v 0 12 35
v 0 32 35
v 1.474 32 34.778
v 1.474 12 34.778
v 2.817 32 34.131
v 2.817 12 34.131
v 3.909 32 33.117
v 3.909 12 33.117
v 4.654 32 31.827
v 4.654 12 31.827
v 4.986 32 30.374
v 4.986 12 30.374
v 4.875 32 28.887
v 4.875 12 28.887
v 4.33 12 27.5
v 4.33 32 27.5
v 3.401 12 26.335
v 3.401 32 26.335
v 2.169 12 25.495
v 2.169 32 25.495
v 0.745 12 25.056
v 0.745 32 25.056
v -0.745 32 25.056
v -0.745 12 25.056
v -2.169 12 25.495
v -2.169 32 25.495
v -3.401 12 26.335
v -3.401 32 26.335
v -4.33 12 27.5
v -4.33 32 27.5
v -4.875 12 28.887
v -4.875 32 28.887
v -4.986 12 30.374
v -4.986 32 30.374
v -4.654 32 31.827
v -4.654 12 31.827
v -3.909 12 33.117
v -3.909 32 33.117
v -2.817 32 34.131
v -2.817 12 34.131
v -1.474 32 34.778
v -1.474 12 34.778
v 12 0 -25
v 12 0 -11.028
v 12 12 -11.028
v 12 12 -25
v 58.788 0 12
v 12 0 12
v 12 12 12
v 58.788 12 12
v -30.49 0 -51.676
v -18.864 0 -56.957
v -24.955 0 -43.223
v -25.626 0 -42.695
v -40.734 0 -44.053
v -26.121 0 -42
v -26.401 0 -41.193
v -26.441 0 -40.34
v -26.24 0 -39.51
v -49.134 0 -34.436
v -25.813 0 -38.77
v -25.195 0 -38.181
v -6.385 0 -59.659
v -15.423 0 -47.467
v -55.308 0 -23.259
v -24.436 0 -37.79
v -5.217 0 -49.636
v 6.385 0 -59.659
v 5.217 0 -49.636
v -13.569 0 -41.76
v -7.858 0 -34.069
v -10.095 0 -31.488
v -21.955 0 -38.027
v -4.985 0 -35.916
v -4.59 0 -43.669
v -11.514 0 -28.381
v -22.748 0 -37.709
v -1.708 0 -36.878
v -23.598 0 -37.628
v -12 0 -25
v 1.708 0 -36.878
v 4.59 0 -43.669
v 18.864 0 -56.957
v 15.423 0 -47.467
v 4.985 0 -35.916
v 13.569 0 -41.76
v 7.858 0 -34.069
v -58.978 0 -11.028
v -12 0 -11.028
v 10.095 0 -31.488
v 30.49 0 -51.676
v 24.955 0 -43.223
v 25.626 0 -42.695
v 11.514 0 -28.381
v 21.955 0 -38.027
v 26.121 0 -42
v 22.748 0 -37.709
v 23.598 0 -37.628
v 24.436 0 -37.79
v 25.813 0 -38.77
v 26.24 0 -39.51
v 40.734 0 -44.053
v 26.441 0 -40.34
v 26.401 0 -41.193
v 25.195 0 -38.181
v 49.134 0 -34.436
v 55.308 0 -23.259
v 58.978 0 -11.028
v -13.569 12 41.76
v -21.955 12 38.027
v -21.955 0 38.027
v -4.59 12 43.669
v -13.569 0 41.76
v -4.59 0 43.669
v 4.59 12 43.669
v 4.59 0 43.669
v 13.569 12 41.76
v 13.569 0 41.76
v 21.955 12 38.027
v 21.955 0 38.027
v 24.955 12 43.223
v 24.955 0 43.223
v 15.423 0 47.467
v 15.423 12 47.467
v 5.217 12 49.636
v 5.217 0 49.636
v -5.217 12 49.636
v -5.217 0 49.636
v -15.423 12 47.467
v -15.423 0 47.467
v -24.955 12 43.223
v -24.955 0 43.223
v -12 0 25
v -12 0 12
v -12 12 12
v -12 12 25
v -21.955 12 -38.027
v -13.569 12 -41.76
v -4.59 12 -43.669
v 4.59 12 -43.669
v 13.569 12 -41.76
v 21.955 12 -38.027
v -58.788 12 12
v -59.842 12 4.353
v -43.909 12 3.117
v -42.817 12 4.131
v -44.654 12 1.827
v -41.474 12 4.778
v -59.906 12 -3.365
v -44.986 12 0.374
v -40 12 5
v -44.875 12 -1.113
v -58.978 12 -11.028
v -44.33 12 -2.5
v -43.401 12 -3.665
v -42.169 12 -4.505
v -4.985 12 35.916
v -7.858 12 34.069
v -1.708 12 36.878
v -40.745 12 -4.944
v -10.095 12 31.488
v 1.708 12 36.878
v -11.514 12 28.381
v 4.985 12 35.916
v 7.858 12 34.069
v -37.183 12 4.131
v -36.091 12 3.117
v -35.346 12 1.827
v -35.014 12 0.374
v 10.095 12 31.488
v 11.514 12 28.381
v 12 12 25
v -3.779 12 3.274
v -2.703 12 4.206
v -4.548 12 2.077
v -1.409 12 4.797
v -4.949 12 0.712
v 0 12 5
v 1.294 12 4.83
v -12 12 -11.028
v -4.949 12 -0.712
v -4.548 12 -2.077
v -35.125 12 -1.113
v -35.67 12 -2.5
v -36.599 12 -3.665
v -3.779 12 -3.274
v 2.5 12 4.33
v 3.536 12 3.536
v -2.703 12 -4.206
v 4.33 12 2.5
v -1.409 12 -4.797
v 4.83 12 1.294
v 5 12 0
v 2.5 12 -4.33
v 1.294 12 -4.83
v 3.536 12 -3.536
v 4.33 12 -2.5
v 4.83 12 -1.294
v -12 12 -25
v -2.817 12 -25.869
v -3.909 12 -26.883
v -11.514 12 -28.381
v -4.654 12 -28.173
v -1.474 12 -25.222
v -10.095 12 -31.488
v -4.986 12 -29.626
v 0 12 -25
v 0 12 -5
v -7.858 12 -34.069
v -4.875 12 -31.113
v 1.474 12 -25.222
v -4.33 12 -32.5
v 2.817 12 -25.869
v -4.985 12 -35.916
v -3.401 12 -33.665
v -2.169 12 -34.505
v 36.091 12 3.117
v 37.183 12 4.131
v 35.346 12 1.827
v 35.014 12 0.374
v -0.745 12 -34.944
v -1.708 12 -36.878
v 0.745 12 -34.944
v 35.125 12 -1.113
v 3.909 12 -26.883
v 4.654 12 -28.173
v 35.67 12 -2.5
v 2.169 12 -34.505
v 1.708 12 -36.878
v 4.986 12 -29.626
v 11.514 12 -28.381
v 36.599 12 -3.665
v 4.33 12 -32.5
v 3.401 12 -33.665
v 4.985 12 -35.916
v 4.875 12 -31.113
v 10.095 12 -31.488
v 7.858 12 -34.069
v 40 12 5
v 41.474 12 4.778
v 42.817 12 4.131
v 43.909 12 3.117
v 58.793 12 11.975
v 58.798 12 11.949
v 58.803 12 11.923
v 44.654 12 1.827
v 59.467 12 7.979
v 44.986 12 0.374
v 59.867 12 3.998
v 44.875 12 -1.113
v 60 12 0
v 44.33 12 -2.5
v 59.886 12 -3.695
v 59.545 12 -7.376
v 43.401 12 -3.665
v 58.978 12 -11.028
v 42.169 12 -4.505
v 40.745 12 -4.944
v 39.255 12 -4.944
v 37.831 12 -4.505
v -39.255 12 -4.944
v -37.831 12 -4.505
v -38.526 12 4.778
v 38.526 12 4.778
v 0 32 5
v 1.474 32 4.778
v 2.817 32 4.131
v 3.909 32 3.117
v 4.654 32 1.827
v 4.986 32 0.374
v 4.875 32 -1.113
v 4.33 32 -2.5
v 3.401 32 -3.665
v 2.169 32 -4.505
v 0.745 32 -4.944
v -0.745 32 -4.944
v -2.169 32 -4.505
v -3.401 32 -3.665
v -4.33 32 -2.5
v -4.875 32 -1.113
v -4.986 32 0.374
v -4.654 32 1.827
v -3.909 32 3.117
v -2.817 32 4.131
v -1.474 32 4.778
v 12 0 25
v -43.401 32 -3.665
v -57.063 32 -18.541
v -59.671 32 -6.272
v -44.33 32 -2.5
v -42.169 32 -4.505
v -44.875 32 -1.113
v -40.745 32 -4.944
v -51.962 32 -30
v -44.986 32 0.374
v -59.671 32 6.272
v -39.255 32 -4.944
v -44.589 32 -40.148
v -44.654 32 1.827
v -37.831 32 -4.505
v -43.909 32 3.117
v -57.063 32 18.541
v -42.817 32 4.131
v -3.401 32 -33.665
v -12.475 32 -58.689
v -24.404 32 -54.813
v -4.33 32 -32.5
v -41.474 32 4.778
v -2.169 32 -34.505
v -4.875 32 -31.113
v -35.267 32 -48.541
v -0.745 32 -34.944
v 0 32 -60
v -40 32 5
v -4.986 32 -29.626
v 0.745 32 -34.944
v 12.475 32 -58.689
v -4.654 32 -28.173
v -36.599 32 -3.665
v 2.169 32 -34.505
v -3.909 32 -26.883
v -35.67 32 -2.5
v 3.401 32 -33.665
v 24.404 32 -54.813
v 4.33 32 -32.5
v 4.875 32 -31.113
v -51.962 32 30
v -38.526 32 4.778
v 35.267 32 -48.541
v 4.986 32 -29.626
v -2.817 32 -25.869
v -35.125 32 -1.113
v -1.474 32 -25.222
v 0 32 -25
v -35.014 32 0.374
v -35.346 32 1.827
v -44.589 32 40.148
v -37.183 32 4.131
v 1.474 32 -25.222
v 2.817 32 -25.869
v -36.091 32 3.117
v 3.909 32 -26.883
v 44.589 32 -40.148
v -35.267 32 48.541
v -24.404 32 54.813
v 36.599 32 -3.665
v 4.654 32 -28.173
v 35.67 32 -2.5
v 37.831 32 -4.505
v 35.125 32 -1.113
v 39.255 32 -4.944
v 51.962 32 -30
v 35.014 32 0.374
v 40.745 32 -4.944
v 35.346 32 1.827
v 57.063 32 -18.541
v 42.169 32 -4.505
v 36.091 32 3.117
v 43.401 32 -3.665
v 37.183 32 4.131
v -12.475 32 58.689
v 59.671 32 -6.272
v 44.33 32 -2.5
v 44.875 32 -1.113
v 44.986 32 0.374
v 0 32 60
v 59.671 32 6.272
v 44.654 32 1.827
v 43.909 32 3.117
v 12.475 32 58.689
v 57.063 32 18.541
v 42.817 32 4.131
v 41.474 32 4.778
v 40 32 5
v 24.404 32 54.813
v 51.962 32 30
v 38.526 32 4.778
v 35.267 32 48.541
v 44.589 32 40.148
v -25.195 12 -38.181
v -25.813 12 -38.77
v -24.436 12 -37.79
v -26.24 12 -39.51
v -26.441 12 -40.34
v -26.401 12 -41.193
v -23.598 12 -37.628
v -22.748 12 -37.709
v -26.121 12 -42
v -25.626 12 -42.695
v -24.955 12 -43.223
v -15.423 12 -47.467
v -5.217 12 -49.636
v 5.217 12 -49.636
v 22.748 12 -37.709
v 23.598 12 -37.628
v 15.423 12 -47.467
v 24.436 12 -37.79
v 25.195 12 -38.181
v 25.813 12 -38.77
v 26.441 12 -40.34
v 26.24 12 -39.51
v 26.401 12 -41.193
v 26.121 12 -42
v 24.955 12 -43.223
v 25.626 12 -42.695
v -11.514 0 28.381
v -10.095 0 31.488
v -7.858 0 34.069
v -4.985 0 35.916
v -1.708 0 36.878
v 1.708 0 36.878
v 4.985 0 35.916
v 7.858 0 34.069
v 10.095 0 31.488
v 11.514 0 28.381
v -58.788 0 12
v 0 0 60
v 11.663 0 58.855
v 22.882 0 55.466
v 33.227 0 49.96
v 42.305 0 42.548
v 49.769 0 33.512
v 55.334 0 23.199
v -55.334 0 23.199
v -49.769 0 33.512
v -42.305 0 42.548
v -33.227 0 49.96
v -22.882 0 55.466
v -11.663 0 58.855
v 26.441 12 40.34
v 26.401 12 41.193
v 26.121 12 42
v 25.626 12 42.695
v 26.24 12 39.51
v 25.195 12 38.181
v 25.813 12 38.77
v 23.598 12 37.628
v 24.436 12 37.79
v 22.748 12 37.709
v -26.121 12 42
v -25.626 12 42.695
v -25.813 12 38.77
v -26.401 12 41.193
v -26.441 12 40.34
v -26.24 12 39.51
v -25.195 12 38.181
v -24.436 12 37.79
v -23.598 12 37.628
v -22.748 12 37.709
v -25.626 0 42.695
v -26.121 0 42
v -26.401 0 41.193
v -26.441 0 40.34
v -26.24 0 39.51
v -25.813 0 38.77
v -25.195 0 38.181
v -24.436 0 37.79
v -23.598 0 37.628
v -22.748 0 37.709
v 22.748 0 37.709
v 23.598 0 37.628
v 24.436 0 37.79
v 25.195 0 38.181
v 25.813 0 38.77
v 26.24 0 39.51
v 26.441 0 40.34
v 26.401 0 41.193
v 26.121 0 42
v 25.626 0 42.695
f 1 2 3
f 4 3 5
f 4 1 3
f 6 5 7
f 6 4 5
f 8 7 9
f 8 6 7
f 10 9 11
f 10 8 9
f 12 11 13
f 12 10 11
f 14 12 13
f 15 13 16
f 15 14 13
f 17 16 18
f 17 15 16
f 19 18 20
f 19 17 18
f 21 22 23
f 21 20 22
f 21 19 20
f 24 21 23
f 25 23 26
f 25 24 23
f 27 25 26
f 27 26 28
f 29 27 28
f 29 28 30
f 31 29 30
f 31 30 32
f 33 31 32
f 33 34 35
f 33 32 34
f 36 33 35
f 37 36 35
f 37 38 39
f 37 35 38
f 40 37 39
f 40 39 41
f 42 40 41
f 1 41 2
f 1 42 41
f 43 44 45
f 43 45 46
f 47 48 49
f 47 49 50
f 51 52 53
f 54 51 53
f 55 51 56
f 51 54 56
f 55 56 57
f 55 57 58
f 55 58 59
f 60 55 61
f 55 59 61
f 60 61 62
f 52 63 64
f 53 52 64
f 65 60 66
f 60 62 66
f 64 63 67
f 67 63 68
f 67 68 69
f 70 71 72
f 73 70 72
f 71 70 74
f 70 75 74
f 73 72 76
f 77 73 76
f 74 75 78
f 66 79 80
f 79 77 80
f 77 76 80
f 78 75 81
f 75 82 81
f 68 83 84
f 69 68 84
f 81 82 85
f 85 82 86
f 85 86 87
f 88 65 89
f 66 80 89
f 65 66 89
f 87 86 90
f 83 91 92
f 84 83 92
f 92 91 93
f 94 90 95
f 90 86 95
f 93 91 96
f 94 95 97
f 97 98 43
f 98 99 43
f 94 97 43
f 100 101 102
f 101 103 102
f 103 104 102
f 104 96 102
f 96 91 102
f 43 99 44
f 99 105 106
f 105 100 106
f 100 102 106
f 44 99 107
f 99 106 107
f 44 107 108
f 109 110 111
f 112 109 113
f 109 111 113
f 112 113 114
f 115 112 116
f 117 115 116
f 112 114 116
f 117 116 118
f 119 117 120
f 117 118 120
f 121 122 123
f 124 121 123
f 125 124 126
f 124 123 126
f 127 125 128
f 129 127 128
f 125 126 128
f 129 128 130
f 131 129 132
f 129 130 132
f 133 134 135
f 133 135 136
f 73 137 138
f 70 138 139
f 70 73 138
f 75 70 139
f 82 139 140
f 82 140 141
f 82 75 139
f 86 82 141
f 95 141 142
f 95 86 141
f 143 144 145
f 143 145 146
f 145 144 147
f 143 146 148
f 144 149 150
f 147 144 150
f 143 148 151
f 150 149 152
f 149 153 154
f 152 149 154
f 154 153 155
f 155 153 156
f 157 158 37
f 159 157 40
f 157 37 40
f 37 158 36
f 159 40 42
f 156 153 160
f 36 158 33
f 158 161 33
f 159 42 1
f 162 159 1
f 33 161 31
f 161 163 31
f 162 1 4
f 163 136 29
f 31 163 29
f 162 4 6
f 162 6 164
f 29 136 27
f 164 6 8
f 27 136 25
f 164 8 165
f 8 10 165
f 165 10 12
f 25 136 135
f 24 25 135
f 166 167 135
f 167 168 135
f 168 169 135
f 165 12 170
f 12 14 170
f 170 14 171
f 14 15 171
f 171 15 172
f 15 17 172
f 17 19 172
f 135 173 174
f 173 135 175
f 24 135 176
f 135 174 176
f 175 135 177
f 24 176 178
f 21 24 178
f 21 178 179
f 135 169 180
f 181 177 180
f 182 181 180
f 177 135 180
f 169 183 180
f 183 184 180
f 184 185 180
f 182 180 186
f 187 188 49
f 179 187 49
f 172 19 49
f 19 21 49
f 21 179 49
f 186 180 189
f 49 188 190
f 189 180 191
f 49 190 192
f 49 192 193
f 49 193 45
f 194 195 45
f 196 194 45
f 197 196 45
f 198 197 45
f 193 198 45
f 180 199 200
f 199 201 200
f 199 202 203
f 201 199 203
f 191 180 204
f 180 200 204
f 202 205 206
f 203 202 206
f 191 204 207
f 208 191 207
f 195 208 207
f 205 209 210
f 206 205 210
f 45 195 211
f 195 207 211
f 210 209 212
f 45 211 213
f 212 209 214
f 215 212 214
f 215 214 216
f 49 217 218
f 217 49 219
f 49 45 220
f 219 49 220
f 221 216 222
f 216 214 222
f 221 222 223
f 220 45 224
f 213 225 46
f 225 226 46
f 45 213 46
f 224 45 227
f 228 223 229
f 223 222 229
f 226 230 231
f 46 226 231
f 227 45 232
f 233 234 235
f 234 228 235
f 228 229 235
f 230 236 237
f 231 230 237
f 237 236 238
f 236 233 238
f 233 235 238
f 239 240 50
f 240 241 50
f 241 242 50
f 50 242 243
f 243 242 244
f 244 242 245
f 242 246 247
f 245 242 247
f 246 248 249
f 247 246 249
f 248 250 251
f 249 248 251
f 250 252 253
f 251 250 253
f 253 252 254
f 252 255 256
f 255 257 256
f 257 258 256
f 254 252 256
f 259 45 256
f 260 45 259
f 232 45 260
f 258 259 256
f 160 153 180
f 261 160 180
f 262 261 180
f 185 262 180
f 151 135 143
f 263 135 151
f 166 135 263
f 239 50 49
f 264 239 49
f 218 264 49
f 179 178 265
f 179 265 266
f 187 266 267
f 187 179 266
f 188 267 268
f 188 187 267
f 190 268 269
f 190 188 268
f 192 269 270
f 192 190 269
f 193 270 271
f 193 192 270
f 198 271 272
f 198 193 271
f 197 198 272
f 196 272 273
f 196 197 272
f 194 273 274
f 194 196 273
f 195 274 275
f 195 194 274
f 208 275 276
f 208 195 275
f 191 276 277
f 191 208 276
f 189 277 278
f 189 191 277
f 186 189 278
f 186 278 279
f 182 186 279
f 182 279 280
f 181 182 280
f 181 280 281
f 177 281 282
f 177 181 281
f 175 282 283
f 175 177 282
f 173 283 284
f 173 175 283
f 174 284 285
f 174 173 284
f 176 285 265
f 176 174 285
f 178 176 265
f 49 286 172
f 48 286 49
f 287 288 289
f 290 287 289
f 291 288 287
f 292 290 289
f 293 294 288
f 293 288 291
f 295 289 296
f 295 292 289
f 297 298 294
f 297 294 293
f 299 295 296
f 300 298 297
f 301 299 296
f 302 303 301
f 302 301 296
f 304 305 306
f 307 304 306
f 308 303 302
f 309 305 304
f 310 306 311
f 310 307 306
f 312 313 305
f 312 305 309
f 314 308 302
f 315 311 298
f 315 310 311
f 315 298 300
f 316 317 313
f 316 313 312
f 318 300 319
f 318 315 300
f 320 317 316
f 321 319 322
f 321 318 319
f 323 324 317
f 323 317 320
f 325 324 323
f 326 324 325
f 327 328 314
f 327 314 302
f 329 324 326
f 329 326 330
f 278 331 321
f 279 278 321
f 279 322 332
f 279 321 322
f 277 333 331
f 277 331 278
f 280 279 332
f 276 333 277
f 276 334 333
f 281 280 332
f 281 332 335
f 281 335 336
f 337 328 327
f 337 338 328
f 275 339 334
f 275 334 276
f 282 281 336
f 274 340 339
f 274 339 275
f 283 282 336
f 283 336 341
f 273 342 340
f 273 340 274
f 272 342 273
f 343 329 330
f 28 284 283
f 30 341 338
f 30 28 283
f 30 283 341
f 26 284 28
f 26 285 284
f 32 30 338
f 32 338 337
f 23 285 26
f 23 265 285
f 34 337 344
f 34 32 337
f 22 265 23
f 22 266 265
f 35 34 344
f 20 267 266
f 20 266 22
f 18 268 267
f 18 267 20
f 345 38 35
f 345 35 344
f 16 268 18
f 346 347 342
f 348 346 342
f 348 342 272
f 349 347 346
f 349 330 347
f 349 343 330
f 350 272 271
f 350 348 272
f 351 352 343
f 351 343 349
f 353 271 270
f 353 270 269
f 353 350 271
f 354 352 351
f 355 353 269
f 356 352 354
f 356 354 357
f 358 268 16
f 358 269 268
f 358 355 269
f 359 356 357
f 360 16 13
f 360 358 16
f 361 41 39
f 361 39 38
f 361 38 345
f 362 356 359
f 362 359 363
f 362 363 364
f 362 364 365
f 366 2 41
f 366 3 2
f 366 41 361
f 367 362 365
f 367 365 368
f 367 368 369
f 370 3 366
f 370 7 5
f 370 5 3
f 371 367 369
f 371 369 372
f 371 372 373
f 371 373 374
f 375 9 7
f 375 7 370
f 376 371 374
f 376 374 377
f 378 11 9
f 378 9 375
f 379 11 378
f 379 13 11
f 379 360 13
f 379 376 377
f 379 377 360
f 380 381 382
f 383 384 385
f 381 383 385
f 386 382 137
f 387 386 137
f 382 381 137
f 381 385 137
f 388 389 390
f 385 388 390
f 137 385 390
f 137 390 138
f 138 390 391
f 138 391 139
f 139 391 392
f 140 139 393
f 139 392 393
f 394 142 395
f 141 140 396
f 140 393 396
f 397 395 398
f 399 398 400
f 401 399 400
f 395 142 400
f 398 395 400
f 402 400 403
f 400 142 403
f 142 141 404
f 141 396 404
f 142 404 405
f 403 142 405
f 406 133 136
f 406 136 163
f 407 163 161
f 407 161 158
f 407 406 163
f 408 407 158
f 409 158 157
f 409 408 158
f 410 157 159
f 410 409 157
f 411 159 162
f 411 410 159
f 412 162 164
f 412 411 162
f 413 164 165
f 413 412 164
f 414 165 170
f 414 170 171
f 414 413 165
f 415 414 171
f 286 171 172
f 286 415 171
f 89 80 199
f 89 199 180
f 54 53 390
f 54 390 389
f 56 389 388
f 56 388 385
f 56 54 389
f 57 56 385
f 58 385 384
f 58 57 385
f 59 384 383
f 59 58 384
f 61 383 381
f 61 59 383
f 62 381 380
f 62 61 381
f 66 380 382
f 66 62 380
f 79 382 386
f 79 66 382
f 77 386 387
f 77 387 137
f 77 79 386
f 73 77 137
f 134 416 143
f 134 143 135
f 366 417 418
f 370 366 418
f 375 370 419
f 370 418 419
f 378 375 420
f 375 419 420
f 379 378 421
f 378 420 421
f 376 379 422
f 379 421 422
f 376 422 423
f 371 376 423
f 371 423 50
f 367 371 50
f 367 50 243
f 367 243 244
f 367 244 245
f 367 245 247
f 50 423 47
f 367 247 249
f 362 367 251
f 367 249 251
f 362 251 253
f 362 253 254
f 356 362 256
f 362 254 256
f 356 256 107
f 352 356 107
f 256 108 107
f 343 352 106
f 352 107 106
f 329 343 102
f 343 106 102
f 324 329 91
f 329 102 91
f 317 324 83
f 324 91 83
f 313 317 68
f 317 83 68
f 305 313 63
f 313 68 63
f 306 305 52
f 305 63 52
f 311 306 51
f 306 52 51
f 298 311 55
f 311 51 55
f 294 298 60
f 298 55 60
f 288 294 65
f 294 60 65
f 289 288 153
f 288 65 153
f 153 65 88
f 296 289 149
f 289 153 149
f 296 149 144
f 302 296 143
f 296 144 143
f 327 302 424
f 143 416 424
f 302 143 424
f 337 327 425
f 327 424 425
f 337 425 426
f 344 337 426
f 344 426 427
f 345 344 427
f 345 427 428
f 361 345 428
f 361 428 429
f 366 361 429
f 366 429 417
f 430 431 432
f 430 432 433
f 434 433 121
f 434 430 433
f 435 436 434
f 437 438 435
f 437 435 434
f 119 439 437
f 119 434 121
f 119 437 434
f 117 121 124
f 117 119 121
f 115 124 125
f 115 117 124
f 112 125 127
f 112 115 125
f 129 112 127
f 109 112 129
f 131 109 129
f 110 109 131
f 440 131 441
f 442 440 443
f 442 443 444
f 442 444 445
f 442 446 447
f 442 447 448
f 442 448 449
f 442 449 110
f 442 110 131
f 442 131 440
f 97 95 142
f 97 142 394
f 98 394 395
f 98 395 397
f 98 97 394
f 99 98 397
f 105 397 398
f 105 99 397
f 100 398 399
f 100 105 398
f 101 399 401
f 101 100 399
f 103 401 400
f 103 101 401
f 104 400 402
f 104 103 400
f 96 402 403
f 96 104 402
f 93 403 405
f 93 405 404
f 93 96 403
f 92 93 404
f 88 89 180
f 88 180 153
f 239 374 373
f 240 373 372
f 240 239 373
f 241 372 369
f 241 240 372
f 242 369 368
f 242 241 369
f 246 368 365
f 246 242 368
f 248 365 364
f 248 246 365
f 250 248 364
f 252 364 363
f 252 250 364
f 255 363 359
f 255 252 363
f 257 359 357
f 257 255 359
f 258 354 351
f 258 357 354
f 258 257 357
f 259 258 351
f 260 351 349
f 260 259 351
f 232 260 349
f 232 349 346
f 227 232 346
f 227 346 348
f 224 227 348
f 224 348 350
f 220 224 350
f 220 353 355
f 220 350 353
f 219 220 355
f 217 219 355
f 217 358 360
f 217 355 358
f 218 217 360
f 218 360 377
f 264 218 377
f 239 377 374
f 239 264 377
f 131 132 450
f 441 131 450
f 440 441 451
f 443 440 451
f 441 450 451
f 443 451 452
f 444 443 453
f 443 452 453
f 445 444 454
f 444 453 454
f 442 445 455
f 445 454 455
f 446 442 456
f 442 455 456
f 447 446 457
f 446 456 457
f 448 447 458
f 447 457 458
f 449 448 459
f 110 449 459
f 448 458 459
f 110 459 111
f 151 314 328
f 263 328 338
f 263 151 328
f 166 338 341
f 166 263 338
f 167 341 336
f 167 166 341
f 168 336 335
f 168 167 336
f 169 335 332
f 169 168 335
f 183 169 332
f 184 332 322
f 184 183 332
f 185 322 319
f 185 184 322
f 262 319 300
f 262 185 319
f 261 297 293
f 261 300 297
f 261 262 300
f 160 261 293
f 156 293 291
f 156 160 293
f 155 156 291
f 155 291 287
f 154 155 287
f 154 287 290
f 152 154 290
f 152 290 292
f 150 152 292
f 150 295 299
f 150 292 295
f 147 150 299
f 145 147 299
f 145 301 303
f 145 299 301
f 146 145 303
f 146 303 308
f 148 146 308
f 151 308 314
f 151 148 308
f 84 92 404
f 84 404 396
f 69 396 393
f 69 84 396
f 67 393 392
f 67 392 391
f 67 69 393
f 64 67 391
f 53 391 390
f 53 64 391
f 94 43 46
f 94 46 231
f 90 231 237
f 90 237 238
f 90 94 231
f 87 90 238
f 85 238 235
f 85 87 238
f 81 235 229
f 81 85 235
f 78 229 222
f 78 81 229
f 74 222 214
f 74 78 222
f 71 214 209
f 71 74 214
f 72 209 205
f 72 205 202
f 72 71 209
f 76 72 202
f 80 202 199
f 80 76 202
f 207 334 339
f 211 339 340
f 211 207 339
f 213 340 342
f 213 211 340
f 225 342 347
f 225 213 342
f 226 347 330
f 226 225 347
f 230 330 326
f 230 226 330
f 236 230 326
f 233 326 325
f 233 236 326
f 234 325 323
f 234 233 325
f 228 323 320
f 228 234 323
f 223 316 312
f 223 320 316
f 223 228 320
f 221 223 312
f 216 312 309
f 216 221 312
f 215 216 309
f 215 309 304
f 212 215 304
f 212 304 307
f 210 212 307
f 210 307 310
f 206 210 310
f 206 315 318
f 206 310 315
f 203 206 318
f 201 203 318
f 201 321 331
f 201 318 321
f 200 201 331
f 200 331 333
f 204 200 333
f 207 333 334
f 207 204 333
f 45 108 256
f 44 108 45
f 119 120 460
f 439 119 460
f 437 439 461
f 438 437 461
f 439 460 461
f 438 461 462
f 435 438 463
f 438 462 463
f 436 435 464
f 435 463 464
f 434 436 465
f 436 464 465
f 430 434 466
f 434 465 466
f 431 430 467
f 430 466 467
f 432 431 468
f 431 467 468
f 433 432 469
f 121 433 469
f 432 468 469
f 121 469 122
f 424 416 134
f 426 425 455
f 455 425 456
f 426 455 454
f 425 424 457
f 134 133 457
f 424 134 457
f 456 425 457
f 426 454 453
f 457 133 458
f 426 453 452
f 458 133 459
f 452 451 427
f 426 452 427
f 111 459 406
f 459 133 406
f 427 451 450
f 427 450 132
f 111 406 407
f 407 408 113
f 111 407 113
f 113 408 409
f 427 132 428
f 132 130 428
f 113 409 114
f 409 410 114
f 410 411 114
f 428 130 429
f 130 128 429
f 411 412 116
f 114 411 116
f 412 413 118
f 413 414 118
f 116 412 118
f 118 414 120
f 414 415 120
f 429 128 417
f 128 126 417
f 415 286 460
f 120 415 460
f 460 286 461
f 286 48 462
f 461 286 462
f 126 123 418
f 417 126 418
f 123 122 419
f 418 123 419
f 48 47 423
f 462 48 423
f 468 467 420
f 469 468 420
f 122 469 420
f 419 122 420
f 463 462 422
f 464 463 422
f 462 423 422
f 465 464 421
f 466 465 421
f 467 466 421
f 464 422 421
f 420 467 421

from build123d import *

# Parameters (mm, degrees)
SKETCH4_R           = 60
BOSS_EXTRUDE2_DEPTH = 32
CUT_EXTRUDE1_DEPTH  = 12
CUT_EXTRUDE2_DEPTH  = 12
SKETCH4_18_R        = 5
CUT_EXTRUDE6_DEPTH  = 12
SKETCH4_19_R        = 5
CUT_EXTRUDE7_DEPTH  = 40
SKETCH4_20_R        = 5
CUT_EXTRUDE8_DEPTH  = 40
SKETCH4_21_R        = 5
CUT_EXTRUDE9_DEPTH  = 40
SKETCH4_22_R        = 5
CUT_EXTRUDE10_DEPTH = 40
SKETCH4_23_R        = 5
CUT_EXTRUDE11_DEPTH = 40


with BuildPart() as part:
    # Sketch4 → Boss-Extrude2 (new body)
    with BuildSketch(Plane(origin=(0, 0, 0), x_dir=(1, 0, 0), z_dir=(0, 1, 0))):
        Circle(SKETCH4_R)
    extrude(amount=BOSS_EXTRUDE2_DEPTH)

    # Sketch4<4> → Cut-Extrude1 (cut)
    with BuildSketch(Plane(origin=(0, 0, 0), x_dir=(1, 0, 0), z_dir=(0, 1, 0))):
        with BuildLine():
            ThreePointArc((24.954792471, 43.222968452), (0, 49.909584942), (-24.954792471, 43.222968452))
            ThreePointArc((-24.954792471, 43.222968452), (-26.052868682, 39.124892241), (-21.954792471, 38.026816029))
            ThreePointArc((-21.954792471, 38.026816029), (0, 43.909584942), (21.954792471, 38.026816029))
            ThreePointArc((21.954792471, 38.026816029), (26.052868682, 39.124892241), (24.954792471, 43.222968452))
        make_face()
    extrude(amount=CUT_EXTRUDE1_DEPTH, mode=Mode.SUBTRACT)

    # Sketch4<5> → Cut-Extrude2 (cut)
    with BuildSketch(Plane(origin=(0, 0, 0), x_dir=(1, 0, 0), z_dir=(0, 1, 0))):
        with BuildLine():
            ThreePointArc((24.954792471, -43.222968452), (0, -49.909584942), (-24.954792471, -43.222968452))
            ThreePointArc((-24.954792471, -43.222968452), (-26.052868682, -39.124892241), (-21.954792471, -38.026816029))
            ThreePointArc((-21.954792471, -38.026816029), (0, -43.909584942), (21.954792471, -38.026816029))
            ThreePointArc((21.954792471, -38.026816029), (26.052868682, -39.124892241), (24.954792471, -43.222968452))
        make_face()
    extrude(amount=CUT_EXTRUDE2_DEPTH, mode=Mode.SUBTRACT)

    # Sketch4<18> → Cut-Extrude6 (cut)
    with BuildSketch(Plane(origin=(0, 0, 0), x_dir=(1, 0, 0), z_dir=(0, 1, 0))):
        with BuildLine():
            ThreePointArc((60, 0), (59.74389008, 5.537833341), (58.97774673, 11.028390213))
            Line((58.97774673, 11.028390213), (12, 11.028390213))
            Line((12, 11.028390213), (12, 25))
            ThreePointArc((12, 25), (0, 37), (-12, 25))
            Line((-12, 25), (-12, 11.028390213))
            Line((-12, 11.028390213), (-58.97774673, 11.028390213))
            ThreePointArc((-58.97774673, 11.028390213), (-59.997958043, -0.495005778), (-58.787753827, -12))
            Line((-58.787753827, -12), (-12, -12))
            Line((-12, -12), (-12, -25))
            ThreePointArc((-12, -25), (0, -37), (12, -25))
            Line((12, -25), (12, -12))
            Line((12, -12), (58.787753827, -12))
            ThreePointArc((58.787753827, -12), (58.795548236, -11.961751865), (58.80331776, -11.923498667))
            ThreePointArc((58.80331776, -11.923498667), (59.700079839, -5.99169986), (60, 0))
        make_face()
        with Locations((0, -30)):
            Circle(SKETCH4_18_R, mode=Mode.SUBTRACT)
        with Locations((-40, 0)):
            Circle(SKETCH4_18_R, mode=Mode.SUBTRACT)
        with BuildLine():
            ThreePointArc((0, 5), (3.535533906, 3.535533906), (5, 0))
            ThreePointArc((5, 0), (-3.535533906, -3.535533906), (0, 5))
        make_face(mode=Mode.SUBTRACT)
        with Locations((40, 0)):
            Circle(SKETCH4_18_R, mode=Mode.SUBTRACT)
        with Locations((0, 30)):
            Circle(SKETCH4_18_R, mode=Mode.SUBTRACT)
    extrude(amount=CUT_EXTRUDE6_DEPTH, mode=Mode.SUBTRACT)

    # Sketch4<19> → Cut-Extrude7 (cut)
    with BuildSketch(Plane(origin=(0, 0, 0), x_dir=(1, 0, 0), z_dir=(0, 1, 0))):
        with Locations((0, -30)):
            Circle(SKETCH4_19_R)
    extrude(amount=CUT_EXTRUDE7_DEPTH, mode=Mode.SUBTRACT)

    # Sketch4<20> → Cut-Extrude8 (cut)
    with BuildSketch(Plane(origin=(0, 0, 0), x_dir=(1, 0, 0), z_dir=(0, 1, 0))):
        with Locations((-40, 0)):
            Circle(SKETCH4_20_R)
    extrude(amount=CUT_EXTRUDE8_DEPTH, mode=Mode.SUBTRACT)

    # Sketch4<21> → Cut-Extrude9 (cut)
    with BuildSketch(Plane(origin=(0, 0, 0), x_dir=(1, 0, 0), z_dir=(0, 1, 0))):
        Circle(SKETCH4_21_R)
    extrude(amount=CUT_EXTRUDE9_DEPTH, mode=Mode.SUBTRACT)

    # Sketch4<22> → Cut-Extrude10 (cut)
    with BuildSketch(Plane(origin=(0, 0, 0), x_dir=(1, 0, 0), z_dir=(0, 1, 0))):
        with Locations((40, 0)):
            Circle(SKETCH4_22_R)
    extrude(amount=CUT_EXTRUDE10_DEPTH, mode=Mode.SUBTRACT)

    # Sketch4<23> → Cut-Extrude11 (cut)
    with BuildSketch(Plane(origin=(0, 0, 0), x_dir=(1, 0, 0), z_dir=(0, 1, 0))):
        with Locations((0, 30)):
            Circle(SKETCH4_23_R)
    extrude(amount=CUT_EXTRUDE11_DEPTH, mode=Mode.SUBTRACT)


solid = part.part
